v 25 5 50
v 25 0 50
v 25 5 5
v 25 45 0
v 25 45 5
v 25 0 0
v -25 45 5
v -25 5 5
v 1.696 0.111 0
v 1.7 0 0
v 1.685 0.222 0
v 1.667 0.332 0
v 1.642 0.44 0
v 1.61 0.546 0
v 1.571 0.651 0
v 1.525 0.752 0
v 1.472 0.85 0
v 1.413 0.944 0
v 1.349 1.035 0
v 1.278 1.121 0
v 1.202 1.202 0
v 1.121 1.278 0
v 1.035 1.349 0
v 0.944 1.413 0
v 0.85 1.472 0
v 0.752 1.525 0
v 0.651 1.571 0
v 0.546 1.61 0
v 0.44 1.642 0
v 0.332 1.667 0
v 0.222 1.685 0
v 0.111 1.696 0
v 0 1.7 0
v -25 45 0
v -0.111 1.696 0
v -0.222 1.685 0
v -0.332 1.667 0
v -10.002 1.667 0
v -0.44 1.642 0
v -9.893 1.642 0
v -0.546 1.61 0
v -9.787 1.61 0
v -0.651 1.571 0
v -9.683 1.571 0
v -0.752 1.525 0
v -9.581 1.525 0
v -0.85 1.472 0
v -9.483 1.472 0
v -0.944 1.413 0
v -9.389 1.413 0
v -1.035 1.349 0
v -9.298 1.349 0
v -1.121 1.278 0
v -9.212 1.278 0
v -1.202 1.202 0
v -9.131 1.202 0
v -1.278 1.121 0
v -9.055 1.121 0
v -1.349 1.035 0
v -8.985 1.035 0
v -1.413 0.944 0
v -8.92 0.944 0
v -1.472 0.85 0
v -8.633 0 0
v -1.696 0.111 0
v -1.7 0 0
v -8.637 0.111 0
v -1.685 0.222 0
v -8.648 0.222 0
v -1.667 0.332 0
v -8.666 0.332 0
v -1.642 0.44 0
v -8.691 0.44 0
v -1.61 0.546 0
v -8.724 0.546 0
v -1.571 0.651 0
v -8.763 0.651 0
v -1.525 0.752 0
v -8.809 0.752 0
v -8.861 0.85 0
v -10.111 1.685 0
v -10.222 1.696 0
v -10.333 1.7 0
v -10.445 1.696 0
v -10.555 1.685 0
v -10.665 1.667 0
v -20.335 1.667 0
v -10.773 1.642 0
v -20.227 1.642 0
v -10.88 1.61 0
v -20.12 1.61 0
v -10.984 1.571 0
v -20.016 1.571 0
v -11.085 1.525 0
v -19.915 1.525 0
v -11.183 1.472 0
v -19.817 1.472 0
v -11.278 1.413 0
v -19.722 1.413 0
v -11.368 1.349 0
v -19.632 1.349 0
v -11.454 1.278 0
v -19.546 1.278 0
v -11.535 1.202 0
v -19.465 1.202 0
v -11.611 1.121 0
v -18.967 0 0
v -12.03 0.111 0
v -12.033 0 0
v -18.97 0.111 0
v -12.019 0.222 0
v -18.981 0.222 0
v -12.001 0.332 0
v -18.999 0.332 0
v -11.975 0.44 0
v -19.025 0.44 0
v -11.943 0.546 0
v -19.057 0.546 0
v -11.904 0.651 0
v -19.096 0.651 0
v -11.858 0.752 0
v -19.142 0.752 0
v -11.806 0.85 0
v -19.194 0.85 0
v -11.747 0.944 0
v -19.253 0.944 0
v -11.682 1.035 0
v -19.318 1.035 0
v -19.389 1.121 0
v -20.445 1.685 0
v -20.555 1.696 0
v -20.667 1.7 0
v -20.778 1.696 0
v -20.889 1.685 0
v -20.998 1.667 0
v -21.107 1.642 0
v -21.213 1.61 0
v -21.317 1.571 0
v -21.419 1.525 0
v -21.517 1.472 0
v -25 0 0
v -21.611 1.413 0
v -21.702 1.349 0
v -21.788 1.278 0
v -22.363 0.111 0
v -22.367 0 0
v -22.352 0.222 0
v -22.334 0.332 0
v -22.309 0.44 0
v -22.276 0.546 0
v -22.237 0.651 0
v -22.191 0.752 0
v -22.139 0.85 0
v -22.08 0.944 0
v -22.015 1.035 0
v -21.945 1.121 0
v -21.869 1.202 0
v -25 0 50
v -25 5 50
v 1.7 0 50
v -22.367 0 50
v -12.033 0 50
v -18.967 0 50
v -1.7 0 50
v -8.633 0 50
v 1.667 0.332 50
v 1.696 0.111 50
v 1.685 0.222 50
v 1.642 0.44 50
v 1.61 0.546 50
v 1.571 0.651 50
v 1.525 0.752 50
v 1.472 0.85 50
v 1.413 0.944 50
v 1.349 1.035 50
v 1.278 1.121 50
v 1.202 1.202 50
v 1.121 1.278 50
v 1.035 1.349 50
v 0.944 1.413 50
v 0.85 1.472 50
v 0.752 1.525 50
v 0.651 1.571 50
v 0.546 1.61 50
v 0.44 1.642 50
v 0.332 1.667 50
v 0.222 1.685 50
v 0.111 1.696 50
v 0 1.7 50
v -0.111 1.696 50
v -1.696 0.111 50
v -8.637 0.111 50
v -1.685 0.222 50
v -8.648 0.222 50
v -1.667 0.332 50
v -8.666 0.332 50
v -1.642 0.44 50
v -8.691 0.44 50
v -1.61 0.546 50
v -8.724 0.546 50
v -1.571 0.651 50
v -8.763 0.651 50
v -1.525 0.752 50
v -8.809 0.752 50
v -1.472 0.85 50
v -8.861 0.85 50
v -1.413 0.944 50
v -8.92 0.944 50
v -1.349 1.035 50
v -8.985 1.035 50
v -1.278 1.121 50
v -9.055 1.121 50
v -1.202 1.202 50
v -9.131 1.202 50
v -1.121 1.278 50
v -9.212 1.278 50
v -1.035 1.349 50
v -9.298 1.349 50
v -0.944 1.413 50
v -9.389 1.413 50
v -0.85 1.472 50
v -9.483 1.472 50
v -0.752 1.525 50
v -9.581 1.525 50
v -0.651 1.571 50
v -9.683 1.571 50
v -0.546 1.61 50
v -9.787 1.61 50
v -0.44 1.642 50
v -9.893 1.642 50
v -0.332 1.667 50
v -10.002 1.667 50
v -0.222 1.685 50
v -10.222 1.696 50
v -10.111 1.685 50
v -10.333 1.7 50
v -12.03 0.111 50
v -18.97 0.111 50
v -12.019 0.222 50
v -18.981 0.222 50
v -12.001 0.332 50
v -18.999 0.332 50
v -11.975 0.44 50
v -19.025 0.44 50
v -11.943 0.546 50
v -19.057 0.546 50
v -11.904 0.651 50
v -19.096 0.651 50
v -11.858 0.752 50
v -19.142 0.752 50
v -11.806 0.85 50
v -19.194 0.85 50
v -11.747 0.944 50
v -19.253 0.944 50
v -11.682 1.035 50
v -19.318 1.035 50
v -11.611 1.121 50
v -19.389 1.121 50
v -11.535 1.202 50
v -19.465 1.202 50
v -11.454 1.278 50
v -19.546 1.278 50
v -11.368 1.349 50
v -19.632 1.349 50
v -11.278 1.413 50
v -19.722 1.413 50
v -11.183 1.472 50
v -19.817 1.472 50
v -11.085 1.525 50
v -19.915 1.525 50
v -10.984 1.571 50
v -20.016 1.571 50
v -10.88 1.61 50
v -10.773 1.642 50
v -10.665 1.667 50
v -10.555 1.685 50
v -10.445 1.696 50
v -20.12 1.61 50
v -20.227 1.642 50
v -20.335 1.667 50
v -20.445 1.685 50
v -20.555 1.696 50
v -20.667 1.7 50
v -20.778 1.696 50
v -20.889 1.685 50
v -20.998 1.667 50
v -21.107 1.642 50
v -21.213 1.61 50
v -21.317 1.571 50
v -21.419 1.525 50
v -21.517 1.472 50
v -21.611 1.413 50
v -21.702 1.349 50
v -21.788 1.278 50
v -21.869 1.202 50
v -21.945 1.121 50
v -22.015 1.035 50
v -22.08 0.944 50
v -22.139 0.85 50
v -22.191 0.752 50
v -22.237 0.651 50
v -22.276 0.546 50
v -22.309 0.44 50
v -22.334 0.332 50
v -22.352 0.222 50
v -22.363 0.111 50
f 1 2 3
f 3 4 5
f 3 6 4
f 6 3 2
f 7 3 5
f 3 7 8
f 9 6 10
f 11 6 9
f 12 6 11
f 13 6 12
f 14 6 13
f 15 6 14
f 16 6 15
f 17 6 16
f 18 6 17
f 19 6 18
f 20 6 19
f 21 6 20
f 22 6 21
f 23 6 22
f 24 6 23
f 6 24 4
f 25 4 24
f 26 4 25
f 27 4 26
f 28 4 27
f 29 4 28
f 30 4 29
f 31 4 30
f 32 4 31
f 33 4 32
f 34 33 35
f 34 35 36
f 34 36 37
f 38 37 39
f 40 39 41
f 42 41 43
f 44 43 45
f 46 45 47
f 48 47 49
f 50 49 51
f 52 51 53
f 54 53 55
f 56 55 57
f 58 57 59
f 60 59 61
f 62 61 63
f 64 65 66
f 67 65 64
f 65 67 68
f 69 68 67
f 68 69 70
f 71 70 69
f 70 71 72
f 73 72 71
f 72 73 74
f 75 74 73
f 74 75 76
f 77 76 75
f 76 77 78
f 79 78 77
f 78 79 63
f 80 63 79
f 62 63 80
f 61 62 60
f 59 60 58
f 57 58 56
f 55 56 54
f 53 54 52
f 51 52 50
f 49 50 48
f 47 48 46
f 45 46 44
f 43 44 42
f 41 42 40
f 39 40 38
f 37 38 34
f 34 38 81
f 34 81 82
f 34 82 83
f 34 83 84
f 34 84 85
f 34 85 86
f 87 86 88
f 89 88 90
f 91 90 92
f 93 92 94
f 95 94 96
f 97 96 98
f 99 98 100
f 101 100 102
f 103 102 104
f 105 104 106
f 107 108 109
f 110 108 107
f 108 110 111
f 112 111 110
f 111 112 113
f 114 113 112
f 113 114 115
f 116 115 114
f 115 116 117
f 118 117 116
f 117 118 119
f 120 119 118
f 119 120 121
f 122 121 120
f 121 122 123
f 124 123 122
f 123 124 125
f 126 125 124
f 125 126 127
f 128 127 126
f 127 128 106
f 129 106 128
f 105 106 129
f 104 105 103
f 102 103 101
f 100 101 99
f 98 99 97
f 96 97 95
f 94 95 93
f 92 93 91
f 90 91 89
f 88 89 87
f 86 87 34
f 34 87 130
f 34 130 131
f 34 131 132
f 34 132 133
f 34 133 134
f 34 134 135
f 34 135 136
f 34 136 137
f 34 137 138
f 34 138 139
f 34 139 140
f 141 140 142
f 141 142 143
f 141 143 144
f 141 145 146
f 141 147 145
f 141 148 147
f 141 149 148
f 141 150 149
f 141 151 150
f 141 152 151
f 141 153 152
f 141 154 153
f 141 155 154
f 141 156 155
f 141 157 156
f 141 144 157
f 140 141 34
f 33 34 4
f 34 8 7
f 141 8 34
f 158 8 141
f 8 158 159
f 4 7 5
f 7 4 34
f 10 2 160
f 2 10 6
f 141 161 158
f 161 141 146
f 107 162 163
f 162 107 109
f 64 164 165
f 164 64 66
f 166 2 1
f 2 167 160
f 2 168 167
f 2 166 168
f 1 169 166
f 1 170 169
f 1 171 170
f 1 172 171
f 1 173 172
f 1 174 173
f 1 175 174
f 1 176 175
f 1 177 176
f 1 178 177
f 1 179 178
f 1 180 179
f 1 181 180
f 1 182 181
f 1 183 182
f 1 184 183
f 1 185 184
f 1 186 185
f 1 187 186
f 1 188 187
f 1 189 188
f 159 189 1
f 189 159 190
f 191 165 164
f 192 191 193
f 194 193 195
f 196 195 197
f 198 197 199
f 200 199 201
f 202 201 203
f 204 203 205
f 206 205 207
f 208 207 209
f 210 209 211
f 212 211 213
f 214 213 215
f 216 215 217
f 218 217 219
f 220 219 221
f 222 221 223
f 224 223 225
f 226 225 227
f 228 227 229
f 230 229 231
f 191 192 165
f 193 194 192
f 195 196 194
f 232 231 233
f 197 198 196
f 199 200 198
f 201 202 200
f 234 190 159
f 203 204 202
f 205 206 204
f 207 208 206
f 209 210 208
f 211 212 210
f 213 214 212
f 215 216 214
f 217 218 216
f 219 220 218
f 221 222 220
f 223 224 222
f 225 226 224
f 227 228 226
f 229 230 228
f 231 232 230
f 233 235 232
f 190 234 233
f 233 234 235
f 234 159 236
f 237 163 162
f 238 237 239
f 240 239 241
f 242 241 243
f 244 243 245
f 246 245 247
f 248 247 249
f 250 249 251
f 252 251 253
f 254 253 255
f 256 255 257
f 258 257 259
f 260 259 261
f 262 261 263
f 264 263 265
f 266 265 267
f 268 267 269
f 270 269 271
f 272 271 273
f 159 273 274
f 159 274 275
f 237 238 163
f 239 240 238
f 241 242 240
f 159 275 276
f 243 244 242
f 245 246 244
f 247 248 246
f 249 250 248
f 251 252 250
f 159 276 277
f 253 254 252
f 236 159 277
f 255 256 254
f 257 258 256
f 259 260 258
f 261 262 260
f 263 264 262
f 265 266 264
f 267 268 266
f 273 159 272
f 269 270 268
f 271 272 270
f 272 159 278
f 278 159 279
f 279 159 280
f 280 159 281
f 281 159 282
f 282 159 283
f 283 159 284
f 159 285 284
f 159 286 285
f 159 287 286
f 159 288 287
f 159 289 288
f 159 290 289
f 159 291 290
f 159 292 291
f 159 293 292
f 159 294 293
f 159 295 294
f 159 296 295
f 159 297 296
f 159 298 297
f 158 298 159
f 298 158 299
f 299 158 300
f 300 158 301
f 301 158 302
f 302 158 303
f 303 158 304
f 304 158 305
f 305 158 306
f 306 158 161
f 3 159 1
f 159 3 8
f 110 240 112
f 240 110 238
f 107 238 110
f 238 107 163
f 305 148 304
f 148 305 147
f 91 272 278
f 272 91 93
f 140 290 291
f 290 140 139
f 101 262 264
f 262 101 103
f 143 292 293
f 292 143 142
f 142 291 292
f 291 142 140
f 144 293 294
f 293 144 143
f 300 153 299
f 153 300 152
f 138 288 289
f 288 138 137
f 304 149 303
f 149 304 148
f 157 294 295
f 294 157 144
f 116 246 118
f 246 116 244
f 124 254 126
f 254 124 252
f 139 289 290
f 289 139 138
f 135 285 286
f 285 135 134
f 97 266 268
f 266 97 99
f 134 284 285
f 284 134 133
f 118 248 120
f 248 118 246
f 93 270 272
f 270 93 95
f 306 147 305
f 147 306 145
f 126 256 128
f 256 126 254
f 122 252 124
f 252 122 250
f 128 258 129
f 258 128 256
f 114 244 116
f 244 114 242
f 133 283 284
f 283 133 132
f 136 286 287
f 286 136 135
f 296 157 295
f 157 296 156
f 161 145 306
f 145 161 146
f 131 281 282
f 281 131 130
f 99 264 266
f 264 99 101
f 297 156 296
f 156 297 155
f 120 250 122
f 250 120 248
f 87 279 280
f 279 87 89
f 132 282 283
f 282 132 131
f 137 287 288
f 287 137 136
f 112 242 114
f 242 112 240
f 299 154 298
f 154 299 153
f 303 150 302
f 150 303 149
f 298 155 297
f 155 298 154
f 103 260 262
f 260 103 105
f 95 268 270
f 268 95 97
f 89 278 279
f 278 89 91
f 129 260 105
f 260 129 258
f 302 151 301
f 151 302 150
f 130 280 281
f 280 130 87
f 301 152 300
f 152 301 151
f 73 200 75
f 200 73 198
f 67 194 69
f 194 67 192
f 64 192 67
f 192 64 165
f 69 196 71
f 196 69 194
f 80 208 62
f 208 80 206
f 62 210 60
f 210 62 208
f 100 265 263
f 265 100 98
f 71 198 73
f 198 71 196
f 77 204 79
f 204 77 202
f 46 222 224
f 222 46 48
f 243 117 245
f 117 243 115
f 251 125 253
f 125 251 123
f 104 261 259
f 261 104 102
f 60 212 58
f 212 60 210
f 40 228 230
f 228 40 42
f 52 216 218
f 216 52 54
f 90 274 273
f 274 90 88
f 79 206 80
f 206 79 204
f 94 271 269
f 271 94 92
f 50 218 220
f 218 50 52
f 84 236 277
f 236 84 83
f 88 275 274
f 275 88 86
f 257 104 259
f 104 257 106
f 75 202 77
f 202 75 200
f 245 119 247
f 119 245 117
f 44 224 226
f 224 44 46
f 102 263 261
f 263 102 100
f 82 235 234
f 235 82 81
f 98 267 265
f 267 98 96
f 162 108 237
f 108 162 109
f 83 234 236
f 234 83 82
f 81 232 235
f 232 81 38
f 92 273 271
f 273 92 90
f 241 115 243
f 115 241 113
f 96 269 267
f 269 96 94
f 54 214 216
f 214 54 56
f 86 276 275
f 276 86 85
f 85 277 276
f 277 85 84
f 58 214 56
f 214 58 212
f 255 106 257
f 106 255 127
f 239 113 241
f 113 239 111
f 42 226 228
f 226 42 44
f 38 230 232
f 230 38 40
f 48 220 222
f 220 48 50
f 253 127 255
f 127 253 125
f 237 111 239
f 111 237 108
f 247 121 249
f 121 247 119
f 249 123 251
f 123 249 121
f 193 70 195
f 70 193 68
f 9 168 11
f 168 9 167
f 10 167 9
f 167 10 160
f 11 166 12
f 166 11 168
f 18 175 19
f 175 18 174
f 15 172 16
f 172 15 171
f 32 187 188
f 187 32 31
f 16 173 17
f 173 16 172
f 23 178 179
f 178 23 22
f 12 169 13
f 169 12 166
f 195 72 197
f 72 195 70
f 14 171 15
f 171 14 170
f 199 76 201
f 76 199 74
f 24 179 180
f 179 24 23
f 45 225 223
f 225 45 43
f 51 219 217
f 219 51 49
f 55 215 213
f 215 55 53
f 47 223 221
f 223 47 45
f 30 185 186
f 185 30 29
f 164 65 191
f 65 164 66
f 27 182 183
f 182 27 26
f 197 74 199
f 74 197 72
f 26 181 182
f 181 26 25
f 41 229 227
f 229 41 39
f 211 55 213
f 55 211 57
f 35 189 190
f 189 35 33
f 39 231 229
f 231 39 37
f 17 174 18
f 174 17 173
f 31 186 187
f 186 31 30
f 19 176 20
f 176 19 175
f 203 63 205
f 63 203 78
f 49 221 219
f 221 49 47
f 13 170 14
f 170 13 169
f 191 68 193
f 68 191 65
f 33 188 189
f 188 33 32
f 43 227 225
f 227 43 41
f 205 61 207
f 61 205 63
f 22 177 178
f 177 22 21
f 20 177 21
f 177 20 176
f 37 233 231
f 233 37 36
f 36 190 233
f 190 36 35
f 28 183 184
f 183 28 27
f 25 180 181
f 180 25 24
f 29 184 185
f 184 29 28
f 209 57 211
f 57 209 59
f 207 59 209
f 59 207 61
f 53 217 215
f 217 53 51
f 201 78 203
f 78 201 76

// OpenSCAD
// L-shaped mounting bracket for NEMA 17 stepper motor
// Print orientation: base plate on bed (z = 0), vertical plate builds upward (+Z)

// ---------------- Parameters ----------------
base_x0      = -25;    // base plate: x start
base_x1      = 25;     // base plate: x end
base_y0      = 0;      // base plate: y start
base_y1      = 45;     // base plate: y end
base_z0      = 0;      // base plate: z start
base_z1      = 5;      // base plate: z end

motor_plate_x0 = -25;  // motor plate: x start
motor_plate_x1 = 25;   // motor plate: x end
motor_plate_y0 = 0;    // motor plate: y start
motor_plate_y1 = 5;    // motor plate: y end
motor_plate_z0 = 0;    // motor plate: z start
motor_plate_z1 = 50;   // motor plate: z end

boss_hole_d  = 23;     // motor centring boss hole diameter
boss_x       = 0;      // boss hole centre X
boss_z       = 28;     // boss hole centre Z

screw_hole_d = 3.4;    // M3 screw hole diameter
screw_pat_h  = 31;     // square pattern side length

gusset_t     = 5;      // gusset thickness (X)
gusset_leg   = 20;     // right triangle leg length (Y and Z)
gusset_x0    = -25;    // left gusset X start
gusset_x1    = -20;    // left gusset X end

eps          = 0.5;    // cutter overshoot past faces

$fn = 96;

// ---------------- Model ----------------
difference() {
    union() {
        // Base plate
        translate([base_x0, base_y0, base_z0])
            cube([base_x1 - base_x0, base_y1 - base_y0, base_z1 - base_z0]);

        // Vertical motor plate
        translate([motor_plate_x0, motor_plate_y0, motor_plate_z0])
            cube([motor_plate_x1 - motor_plate_x0, motor_plate_y1 - motor_plate_y0, motor_plate_z1 - motor_plate_z0]);

        // Left gusset (flush with left edge)
        translate([gusset_x0, 0, 0])
            linear_extrude(height = gusset_leg, rotate_90 = true)
                polygon([[gusset_leg, 0], [0, gusset_leg]]);

        // Right gusset (flush with right edge)
        translate([gusset_x1, 0, 0])
            linear_extrude(height = gusset_leg, rotate_90 = true)
                polygon([[0, gusset_leg], [gusset_leg, 0]]);
    }

    // Motor boss hole (along Y)
    translate([boss_x, motor_plate_y0 - eps, boss_z])
        rotate([90, 0, 0])
            cylinder(d = boss_hole_d, h = motor_plate_y1 - motor_plate_y0 + 2 * eps);

    // M3 screw holes on square pattern
    for (i = [0 : 3]) {
        for (j = [0 : 3]) {
            x = -screw_pat_h / 2 + (i - 1.5) * screw_pat_h / 3;
            y = -screw_pat_h / 2 + (j - 1.5) * screw_pat_h / 3;
            translate([x, y, -eps])
                cylinder(d = screw_hole_d, h = base_z1 + motor_plate_z1 + 2 * eps);
        }
    }
}
